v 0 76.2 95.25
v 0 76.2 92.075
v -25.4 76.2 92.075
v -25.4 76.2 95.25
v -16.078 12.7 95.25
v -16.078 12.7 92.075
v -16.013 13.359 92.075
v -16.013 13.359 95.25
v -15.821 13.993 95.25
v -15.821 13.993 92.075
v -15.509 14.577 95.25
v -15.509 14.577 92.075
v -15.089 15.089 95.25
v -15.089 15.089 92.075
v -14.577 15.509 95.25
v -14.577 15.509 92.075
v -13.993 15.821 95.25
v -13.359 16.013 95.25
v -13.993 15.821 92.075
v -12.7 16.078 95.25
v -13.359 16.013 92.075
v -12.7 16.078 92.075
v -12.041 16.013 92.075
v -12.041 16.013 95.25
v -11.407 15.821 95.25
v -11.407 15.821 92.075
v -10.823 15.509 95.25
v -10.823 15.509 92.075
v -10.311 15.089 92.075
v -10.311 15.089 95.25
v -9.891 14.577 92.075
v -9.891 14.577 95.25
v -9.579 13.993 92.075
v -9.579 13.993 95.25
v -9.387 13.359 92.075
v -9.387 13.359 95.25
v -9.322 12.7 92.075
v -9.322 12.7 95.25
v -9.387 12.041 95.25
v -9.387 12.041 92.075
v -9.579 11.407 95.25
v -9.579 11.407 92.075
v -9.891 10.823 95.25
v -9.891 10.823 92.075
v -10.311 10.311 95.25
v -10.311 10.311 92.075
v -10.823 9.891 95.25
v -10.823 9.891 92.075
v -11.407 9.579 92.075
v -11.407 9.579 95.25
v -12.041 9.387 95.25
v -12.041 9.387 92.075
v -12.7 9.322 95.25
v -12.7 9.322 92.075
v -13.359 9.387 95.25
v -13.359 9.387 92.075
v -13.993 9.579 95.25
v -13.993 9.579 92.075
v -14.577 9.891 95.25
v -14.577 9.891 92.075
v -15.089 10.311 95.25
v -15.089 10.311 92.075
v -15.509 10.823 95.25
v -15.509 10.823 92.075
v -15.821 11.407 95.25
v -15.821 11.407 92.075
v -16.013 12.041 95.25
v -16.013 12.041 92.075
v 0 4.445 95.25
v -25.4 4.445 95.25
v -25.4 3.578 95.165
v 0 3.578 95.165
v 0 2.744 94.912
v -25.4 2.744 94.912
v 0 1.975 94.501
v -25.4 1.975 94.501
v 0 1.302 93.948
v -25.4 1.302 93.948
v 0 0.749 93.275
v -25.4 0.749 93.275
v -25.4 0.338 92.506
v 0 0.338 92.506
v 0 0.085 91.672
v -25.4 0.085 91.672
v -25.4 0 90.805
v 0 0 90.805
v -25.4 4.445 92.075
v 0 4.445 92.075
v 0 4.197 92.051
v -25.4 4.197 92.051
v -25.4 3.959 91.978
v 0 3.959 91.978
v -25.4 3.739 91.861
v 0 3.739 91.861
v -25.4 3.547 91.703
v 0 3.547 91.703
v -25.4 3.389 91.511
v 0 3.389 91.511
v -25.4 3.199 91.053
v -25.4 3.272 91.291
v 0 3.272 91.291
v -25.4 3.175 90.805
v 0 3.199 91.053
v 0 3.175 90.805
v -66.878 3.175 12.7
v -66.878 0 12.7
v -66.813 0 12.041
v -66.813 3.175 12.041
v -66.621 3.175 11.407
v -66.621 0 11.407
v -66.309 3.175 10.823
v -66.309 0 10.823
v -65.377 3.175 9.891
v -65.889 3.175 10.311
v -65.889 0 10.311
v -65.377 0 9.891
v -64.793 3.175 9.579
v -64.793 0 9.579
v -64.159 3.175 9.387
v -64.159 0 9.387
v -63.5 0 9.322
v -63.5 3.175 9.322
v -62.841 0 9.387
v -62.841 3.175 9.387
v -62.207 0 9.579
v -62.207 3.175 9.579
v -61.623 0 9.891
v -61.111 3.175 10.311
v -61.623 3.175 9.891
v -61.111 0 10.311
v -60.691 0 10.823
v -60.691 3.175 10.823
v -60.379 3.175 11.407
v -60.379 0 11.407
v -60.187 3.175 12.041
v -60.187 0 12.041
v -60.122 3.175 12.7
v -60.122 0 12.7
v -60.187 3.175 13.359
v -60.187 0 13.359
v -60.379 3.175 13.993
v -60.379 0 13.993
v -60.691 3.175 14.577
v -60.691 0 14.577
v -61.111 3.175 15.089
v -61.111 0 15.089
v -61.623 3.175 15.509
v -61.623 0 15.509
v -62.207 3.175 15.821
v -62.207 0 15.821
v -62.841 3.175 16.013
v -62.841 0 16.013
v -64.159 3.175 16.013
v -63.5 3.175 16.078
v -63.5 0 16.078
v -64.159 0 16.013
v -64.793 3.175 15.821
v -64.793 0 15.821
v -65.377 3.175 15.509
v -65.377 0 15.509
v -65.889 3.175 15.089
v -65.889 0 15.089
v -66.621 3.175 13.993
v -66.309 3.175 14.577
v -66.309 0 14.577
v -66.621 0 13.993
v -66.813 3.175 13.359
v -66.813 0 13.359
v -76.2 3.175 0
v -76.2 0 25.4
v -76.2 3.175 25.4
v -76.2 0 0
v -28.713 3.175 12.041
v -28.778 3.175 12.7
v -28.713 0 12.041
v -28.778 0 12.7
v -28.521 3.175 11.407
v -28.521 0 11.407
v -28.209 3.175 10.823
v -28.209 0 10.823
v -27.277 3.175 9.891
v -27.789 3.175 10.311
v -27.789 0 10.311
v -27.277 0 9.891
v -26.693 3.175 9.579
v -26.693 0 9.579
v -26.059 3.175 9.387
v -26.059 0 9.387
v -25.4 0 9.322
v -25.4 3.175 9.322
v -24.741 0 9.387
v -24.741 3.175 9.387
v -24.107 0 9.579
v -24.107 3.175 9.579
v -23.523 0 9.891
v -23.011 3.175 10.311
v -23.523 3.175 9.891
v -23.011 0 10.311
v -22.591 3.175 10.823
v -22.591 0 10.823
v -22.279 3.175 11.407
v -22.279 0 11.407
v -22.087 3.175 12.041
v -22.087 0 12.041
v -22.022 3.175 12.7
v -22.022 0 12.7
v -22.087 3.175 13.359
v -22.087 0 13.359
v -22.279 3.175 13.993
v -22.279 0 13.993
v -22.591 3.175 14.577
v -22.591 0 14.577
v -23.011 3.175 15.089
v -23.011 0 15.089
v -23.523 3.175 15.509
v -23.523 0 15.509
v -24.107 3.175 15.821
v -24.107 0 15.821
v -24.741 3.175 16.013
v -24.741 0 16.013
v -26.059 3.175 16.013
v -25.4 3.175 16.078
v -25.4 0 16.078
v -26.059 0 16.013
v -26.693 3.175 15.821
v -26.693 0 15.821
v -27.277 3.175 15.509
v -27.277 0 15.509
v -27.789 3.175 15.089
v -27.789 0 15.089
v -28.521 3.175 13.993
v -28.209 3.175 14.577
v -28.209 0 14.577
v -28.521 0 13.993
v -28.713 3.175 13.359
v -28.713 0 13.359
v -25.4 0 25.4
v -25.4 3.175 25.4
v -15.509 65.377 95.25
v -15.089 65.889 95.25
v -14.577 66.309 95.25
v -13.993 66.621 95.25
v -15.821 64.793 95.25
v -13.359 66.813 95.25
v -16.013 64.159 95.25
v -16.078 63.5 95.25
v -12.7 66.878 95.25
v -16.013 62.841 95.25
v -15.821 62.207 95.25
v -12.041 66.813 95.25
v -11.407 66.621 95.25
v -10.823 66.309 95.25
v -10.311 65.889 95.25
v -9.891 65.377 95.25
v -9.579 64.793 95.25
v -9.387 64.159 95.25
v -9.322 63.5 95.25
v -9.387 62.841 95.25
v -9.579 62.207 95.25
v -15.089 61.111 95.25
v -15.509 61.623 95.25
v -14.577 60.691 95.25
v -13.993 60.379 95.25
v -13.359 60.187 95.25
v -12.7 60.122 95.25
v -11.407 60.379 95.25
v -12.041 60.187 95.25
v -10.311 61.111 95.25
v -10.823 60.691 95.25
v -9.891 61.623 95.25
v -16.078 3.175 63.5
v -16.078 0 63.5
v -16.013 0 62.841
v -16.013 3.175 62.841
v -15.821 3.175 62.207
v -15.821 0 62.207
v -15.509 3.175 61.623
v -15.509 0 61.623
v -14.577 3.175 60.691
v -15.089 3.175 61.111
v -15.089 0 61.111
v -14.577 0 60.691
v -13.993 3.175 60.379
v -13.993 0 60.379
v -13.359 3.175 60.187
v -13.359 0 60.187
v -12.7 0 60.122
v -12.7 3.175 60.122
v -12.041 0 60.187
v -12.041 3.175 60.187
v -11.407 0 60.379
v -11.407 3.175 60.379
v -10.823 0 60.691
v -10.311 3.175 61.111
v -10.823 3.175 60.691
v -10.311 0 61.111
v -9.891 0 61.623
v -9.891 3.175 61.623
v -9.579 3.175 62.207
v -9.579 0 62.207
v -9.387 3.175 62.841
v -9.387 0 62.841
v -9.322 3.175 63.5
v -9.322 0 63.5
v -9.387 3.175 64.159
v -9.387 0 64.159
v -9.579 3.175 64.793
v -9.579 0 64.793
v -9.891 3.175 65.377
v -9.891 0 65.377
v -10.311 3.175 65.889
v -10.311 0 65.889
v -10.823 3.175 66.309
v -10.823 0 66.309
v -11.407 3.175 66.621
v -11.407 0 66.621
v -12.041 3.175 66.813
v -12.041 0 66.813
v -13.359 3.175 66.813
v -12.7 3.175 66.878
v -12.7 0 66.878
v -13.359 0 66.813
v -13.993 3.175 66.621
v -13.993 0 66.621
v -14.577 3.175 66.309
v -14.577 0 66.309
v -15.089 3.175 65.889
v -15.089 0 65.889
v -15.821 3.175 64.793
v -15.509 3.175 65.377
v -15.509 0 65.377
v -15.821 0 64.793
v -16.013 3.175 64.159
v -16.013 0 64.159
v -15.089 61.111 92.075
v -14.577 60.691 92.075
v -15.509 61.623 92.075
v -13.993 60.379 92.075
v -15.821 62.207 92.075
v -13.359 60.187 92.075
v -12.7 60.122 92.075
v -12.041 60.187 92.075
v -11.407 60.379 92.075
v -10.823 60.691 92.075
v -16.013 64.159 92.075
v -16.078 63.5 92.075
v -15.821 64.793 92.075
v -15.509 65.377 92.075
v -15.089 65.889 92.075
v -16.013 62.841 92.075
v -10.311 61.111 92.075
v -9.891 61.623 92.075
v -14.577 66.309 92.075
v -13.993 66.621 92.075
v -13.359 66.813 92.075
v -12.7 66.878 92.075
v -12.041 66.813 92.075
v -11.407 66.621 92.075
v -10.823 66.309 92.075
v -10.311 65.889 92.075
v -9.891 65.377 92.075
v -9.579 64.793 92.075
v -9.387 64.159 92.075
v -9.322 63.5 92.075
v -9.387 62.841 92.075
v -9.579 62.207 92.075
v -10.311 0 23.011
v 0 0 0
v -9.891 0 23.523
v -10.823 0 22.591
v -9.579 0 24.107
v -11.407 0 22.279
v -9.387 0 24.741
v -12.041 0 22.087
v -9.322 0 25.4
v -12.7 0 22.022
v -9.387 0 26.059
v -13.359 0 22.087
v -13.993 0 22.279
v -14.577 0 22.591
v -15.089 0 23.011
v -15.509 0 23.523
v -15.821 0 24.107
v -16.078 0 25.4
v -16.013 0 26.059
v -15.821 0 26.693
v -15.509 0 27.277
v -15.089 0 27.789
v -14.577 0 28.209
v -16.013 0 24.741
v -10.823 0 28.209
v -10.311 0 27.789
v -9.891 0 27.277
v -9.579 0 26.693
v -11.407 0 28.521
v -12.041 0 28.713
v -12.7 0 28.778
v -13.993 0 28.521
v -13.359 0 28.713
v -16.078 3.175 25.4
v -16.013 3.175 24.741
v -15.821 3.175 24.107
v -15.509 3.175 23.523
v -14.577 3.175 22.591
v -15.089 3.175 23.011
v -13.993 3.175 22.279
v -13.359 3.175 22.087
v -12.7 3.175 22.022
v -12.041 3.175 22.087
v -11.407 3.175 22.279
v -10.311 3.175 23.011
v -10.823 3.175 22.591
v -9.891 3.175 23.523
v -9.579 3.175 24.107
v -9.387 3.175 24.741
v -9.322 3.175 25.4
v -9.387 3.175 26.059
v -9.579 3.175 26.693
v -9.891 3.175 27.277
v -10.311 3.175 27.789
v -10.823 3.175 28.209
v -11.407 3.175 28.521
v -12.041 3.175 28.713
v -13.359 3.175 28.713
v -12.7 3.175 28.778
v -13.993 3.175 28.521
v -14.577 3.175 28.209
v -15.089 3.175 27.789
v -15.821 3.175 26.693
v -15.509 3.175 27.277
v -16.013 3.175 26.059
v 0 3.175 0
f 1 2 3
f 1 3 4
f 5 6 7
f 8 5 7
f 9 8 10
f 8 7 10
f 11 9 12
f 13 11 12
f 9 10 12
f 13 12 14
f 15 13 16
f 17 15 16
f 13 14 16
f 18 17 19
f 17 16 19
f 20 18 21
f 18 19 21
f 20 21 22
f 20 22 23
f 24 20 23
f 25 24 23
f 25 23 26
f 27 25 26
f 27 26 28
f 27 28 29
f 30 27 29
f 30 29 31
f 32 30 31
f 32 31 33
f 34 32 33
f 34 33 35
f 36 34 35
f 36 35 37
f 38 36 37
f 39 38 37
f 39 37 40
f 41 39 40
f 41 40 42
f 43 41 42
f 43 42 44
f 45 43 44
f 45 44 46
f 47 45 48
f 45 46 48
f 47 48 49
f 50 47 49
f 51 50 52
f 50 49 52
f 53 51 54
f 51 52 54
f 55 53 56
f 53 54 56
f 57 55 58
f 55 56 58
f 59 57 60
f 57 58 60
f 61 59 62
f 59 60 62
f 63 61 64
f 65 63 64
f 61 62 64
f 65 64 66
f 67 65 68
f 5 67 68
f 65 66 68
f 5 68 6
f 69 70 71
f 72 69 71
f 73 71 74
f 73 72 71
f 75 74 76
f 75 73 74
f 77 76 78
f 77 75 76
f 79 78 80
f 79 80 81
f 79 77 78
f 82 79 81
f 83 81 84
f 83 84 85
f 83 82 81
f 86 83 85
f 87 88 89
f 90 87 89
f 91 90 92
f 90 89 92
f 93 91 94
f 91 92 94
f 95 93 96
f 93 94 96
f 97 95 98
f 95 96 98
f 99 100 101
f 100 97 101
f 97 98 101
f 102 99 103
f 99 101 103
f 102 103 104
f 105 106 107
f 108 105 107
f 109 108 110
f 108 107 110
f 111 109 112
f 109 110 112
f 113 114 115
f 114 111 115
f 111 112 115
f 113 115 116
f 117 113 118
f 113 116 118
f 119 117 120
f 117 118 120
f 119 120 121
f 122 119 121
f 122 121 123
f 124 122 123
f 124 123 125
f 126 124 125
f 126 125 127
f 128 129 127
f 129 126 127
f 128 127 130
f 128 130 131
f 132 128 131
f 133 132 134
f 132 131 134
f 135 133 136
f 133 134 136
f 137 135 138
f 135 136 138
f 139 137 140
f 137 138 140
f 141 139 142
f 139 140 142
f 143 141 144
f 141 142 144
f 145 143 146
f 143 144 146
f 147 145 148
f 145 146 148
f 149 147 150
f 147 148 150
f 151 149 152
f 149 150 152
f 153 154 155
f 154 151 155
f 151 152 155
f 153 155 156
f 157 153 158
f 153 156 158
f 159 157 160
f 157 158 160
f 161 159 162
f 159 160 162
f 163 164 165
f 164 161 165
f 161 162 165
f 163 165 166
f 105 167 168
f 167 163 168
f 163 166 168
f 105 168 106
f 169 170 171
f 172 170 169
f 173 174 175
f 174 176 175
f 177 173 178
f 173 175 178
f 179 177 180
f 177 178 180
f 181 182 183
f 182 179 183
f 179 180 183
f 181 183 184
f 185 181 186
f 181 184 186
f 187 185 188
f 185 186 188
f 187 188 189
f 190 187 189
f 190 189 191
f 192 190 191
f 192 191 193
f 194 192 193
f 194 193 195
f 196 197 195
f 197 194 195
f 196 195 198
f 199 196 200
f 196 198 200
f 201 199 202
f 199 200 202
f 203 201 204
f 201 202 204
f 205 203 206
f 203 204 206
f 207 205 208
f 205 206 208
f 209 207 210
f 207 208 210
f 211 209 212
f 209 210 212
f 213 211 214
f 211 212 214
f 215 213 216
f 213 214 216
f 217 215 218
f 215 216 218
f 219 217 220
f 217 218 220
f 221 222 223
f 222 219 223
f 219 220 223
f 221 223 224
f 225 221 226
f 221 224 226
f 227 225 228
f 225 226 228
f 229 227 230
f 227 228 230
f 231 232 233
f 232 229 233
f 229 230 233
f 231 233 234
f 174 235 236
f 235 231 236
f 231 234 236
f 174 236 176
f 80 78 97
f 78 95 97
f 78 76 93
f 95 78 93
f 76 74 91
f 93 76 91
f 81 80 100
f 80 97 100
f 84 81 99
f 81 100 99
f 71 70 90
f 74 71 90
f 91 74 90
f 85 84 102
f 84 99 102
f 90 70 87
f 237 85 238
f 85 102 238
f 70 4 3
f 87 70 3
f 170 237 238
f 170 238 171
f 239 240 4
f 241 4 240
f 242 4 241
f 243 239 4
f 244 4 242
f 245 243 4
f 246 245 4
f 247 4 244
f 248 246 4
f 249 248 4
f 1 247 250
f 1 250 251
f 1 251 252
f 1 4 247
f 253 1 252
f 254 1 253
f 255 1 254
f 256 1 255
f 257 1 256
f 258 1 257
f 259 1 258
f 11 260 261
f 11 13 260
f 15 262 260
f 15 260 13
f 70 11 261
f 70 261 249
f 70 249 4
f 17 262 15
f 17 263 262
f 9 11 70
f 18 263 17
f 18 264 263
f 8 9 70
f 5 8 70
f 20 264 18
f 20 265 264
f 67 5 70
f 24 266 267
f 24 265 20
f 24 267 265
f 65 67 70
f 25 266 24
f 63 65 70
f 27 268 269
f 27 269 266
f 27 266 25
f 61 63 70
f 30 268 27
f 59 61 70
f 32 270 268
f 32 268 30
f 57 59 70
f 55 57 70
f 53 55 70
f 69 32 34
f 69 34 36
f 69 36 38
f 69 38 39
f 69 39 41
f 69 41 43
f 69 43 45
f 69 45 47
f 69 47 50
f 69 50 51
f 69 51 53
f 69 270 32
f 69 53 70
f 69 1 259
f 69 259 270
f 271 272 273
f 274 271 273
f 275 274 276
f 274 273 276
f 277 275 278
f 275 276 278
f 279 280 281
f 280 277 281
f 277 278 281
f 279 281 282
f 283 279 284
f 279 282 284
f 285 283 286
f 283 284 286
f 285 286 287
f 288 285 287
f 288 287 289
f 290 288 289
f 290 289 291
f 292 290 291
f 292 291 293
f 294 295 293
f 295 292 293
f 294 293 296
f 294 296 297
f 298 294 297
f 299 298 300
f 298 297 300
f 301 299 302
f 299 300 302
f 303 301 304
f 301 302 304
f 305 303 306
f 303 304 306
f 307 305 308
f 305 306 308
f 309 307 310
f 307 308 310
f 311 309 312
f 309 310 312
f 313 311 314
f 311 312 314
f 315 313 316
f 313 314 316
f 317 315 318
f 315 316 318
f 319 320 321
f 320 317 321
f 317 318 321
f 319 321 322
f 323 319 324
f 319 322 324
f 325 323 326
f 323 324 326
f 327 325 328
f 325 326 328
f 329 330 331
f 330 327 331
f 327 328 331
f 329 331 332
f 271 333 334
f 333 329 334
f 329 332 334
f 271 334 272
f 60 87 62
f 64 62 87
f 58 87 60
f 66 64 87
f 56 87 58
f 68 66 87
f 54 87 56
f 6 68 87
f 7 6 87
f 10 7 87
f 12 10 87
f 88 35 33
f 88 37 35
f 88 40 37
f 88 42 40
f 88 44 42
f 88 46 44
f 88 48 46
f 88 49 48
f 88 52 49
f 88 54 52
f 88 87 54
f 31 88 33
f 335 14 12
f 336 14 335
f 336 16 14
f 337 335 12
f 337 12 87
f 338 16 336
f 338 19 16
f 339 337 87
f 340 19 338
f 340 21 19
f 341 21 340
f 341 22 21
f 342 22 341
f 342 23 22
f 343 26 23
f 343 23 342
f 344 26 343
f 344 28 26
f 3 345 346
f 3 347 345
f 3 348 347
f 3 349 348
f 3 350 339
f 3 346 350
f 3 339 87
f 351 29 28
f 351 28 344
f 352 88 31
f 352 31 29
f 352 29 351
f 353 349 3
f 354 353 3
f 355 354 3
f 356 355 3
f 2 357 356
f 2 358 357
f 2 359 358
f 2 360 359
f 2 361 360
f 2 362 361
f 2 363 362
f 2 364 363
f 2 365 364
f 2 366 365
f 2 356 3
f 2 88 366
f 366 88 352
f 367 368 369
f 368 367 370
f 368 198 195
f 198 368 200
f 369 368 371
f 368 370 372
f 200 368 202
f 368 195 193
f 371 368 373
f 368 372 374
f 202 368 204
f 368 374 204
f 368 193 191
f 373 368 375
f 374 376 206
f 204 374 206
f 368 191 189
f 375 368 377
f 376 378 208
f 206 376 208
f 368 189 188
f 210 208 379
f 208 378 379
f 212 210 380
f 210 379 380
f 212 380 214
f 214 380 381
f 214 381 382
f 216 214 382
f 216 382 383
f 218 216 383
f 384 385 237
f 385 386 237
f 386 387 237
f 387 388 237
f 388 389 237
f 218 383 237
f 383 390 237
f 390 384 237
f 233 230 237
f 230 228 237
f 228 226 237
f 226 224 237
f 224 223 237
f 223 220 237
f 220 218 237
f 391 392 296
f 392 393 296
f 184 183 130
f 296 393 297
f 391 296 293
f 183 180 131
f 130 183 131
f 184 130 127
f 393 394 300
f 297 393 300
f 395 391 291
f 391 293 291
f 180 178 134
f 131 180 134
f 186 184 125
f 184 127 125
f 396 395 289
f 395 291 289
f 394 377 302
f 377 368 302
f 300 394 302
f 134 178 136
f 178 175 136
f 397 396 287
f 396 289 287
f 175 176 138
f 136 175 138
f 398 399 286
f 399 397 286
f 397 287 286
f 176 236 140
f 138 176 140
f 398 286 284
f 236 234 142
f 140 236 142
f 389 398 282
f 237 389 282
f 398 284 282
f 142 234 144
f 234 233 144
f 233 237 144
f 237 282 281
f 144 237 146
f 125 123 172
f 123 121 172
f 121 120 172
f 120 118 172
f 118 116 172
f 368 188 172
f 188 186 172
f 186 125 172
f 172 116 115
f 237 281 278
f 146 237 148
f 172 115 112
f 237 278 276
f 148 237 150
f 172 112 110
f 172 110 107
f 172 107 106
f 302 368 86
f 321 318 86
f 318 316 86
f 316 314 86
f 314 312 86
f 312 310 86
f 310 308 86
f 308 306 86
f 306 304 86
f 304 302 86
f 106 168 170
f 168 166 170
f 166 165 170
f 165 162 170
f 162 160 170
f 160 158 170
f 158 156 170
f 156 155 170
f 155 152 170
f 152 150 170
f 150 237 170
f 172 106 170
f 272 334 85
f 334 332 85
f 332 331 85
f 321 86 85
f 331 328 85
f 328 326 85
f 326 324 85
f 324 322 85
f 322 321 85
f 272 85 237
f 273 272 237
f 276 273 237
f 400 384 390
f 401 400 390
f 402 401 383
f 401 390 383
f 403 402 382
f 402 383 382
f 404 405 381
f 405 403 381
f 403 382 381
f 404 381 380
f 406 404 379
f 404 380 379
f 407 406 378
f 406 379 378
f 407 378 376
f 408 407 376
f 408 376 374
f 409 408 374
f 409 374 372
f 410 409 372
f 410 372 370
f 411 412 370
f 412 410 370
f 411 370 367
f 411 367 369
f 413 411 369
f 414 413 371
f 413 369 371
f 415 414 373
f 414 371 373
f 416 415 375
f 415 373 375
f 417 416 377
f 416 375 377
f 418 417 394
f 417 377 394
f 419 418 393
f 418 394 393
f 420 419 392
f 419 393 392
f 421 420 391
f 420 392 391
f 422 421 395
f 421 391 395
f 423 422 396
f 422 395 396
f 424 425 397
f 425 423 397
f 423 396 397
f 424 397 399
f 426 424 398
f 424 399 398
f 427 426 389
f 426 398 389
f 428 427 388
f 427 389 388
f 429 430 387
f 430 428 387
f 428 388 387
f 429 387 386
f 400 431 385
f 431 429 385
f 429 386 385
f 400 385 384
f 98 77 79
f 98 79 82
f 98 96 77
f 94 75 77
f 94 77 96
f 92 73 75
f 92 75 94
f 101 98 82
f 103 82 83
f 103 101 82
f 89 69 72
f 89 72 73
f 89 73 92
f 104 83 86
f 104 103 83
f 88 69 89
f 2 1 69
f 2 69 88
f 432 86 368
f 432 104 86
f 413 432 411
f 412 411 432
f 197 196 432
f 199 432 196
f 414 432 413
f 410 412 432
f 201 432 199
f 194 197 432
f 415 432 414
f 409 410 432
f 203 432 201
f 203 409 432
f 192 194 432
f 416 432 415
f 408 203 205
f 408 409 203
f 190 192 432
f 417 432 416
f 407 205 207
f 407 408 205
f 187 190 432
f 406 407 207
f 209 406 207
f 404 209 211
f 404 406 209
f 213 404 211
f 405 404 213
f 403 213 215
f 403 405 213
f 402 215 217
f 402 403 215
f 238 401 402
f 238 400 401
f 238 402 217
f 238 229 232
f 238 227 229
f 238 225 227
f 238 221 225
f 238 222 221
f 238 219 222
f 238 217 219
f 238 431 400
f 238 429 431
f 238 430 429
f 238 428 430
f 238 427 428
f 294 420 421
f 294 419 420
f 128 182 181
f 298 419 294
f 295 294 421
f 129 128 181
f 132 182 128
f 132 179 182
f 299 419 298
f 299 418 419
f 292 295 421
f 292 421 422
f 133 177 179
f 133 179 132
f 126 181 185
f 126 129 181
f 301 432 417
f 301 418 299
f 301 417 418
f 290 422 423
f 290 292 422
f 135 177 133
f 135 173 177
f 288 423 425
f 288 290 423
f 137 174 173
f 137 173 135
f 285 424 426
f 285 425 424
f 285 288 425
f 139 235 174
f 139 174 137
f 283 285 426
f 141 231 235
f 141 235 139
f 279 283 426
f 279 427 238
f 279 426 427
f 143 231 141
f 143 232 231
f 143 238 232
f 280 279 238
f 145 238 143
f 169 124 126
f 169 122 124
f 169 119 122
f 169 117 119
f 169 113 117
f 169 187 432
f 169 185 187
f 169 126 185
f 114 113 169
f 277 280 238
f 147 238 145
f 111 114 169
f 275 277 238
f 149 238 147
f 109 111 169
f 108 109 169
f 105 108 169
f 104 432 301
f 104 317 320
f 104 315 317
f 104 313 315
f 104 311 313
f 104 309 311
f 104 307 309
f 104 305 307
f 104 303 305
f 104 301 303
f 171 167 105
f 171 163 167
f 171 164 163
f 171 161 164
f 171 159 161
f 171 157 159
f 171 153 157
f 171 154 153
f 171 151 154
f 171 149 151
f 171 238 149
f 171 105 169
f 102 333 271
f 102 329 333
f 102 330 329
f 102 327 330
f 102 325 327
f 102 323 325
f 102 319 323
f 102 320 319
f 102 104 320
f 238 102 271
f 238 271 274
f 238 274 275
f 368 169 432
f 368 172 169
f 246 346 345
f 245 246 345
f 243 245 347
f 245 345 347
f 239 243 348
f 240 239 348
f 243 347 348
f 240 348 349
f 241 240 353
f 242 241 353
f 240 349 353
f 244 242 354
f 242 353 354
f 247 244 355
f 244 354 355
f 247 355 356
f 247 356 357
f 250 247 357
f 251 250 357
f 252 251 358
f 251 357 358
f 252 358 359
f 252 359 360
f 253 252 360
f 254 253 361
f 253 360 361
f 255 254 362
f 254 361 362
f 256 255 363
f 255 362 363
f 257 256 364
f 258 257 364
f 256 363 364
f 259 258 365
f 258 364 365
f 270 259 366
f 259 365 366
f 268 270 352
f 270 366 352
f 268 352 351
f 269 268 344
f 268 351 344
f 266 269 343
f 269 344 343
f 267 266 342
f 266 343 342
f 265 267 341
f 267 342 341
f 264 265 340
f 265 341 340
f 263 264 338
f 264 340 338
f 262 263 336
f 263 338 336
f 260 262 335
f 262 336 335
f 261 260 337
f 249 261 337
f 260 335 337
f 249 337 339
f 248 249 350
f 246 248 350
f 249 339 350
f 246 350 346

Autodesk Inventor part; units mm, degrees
ref_plane "YZ Plane" through (0, 0, 0) normal (1, 0, 0) x (0, 1, 0)
ref_plane "XZ Plane" through (0, 0, 0) normal (0, 1, 0) x (-1, 0, 0)
ref_plane "XY Plane" through (0, 0, 0) normal (0, 0, 1) x (1, 0, 0)
sketch "Sketch1" plane through (0, 0, 0) normal (0, 1, 0) x (-1, 0, 0)
  line L0 (0, 0) -> (0, 76.2)
  line L1 (25.4, 76.2) -> (25.4, 25.4)
  line L2 (25.4, 25.4) -> (76.2, 25.4)
  line L3 (76.2, 25.4) -> (76.2, 0)
  line L4 (76.2, 0) -> (0, 0)
  line L5 (25.4, 25.4) -> (0, 0) construction
  circle A0 centre (12.7, 63.5) radius 3.3782
  circle A1 centre (12.7, 25.4) radius 3.3782
  circle A2 centre (25.4, 12.7) radius 3.3782
  circle A3 centre (63.5, 12.7) radius 3.3782
  line L6 (25.4, 76.2) -> (25.4, 95.25)
  line L7 (25.4, 95.25) -> (0, 95.25)
  line L8 (0, 95.25) -> (0, 76.2)
  point P0 (0, 0)
  dimension "d0" = 76.2
  dimension "d1" = 25.4
  dimension "d2" = 50.8
  dimension "d3" = 50.8
  dimension "d4" = 25.4
  dimension "d5" = 6.7564
  dimension "d6" = 6.7564
  dimension "d7" = 6.7564
  dimension "d8" = 6.7564
  dimension "d9" = 12.7
  dimension "d10" = 0
  dimension "d11" = 12.7
  dimension "d12" = 12.7
  dimension "d13" = 12.7
  dimension "d15" = 12.7
  dimension "d17" = 19.05
extrude "Plate1" add sketch "Sketch1" along normal blind 3.175
sketch "Sketch2" plane through (0, 0, 92.075) normal (0, 0, 1) x (1, 0, 0)
  line L0 (-25.4, 0) -> (0, 0)
  line L1 (0, 0) -> (0, 76.2)
  line L2 (0, 76.2) -> (-25.4, 76.2)
  line L3 (-25.4, 76.2) -> (-25.4, 0)
edge flange "Flange1" height 76.2 angle 90 thickness 3.175 bend radius 1.27 thickness toward (0, 0, 1) relief tear relief width 3.175 relief depth 1.5875 edges at (-12.7, 3.175, 95.25) wall of the first edge with corners at (-25.4, 0, 92.075) (0, 0, 92.075) (0, 76.2, 92.075) (-25.4, 76.2, 92.075)
bend "Bend1"
corner "Corner1"
sketch "Sketch3" plane through (0, 76.2, 92.075) normal (0, 0, -1) x (-1, 0, 0)
  line L0 (25.4, 0) -> (0, 0) projected
  circle A0 centre (12.7, -12.7) radius 3.3782
  circle A1 centre (12.7, -63.5) radius 3.3782
  point P0 (0, -76.2)
  dimension "d29" = 6.7564
  dimension "d30" = 6.7564
  dimension "d31" = 12.7
  dimension "d32" = 50.8
extrude "Cut1" cut sketch "Sketch3" against normal blind 3.175
equation "\"d33\" = Thickness"
equation "\"d19\" = BendReliefWidth"
equation "\"d20\" = BendReliefDepth"
equation "\"d21\" = MinimumRemnant"
equation "\"d22\" = BendRadius"
equation "\"d26\" = CornerReliefSize"
equation "\"d27\" = GapSize"
equation "\"d28\" = JacobiRadiusSize"
equation "\"BendRadius\" = Thickness"
equation "\"BendReliefWidth\" = Thickness"
equation "\"BendReliefDepth\" = 0.5 * Thickness"
equation "\"CornerReliefSize\" = 4 * Thickness"
equation "\"MinimumRemnant\" = 2 * Thickness"
equation "\"TransitionRadius\" = BendRadius"
equation "\"JacobiRadiusSize\" = BendRadius"
equation "\"GapSize\" = Thickness"
equation "\"d18\" = BendRadius"
equation "\"Thickness\" = 3.175"
properties part number "Rebuild Gusset 2" material "Aluminum 6061"
